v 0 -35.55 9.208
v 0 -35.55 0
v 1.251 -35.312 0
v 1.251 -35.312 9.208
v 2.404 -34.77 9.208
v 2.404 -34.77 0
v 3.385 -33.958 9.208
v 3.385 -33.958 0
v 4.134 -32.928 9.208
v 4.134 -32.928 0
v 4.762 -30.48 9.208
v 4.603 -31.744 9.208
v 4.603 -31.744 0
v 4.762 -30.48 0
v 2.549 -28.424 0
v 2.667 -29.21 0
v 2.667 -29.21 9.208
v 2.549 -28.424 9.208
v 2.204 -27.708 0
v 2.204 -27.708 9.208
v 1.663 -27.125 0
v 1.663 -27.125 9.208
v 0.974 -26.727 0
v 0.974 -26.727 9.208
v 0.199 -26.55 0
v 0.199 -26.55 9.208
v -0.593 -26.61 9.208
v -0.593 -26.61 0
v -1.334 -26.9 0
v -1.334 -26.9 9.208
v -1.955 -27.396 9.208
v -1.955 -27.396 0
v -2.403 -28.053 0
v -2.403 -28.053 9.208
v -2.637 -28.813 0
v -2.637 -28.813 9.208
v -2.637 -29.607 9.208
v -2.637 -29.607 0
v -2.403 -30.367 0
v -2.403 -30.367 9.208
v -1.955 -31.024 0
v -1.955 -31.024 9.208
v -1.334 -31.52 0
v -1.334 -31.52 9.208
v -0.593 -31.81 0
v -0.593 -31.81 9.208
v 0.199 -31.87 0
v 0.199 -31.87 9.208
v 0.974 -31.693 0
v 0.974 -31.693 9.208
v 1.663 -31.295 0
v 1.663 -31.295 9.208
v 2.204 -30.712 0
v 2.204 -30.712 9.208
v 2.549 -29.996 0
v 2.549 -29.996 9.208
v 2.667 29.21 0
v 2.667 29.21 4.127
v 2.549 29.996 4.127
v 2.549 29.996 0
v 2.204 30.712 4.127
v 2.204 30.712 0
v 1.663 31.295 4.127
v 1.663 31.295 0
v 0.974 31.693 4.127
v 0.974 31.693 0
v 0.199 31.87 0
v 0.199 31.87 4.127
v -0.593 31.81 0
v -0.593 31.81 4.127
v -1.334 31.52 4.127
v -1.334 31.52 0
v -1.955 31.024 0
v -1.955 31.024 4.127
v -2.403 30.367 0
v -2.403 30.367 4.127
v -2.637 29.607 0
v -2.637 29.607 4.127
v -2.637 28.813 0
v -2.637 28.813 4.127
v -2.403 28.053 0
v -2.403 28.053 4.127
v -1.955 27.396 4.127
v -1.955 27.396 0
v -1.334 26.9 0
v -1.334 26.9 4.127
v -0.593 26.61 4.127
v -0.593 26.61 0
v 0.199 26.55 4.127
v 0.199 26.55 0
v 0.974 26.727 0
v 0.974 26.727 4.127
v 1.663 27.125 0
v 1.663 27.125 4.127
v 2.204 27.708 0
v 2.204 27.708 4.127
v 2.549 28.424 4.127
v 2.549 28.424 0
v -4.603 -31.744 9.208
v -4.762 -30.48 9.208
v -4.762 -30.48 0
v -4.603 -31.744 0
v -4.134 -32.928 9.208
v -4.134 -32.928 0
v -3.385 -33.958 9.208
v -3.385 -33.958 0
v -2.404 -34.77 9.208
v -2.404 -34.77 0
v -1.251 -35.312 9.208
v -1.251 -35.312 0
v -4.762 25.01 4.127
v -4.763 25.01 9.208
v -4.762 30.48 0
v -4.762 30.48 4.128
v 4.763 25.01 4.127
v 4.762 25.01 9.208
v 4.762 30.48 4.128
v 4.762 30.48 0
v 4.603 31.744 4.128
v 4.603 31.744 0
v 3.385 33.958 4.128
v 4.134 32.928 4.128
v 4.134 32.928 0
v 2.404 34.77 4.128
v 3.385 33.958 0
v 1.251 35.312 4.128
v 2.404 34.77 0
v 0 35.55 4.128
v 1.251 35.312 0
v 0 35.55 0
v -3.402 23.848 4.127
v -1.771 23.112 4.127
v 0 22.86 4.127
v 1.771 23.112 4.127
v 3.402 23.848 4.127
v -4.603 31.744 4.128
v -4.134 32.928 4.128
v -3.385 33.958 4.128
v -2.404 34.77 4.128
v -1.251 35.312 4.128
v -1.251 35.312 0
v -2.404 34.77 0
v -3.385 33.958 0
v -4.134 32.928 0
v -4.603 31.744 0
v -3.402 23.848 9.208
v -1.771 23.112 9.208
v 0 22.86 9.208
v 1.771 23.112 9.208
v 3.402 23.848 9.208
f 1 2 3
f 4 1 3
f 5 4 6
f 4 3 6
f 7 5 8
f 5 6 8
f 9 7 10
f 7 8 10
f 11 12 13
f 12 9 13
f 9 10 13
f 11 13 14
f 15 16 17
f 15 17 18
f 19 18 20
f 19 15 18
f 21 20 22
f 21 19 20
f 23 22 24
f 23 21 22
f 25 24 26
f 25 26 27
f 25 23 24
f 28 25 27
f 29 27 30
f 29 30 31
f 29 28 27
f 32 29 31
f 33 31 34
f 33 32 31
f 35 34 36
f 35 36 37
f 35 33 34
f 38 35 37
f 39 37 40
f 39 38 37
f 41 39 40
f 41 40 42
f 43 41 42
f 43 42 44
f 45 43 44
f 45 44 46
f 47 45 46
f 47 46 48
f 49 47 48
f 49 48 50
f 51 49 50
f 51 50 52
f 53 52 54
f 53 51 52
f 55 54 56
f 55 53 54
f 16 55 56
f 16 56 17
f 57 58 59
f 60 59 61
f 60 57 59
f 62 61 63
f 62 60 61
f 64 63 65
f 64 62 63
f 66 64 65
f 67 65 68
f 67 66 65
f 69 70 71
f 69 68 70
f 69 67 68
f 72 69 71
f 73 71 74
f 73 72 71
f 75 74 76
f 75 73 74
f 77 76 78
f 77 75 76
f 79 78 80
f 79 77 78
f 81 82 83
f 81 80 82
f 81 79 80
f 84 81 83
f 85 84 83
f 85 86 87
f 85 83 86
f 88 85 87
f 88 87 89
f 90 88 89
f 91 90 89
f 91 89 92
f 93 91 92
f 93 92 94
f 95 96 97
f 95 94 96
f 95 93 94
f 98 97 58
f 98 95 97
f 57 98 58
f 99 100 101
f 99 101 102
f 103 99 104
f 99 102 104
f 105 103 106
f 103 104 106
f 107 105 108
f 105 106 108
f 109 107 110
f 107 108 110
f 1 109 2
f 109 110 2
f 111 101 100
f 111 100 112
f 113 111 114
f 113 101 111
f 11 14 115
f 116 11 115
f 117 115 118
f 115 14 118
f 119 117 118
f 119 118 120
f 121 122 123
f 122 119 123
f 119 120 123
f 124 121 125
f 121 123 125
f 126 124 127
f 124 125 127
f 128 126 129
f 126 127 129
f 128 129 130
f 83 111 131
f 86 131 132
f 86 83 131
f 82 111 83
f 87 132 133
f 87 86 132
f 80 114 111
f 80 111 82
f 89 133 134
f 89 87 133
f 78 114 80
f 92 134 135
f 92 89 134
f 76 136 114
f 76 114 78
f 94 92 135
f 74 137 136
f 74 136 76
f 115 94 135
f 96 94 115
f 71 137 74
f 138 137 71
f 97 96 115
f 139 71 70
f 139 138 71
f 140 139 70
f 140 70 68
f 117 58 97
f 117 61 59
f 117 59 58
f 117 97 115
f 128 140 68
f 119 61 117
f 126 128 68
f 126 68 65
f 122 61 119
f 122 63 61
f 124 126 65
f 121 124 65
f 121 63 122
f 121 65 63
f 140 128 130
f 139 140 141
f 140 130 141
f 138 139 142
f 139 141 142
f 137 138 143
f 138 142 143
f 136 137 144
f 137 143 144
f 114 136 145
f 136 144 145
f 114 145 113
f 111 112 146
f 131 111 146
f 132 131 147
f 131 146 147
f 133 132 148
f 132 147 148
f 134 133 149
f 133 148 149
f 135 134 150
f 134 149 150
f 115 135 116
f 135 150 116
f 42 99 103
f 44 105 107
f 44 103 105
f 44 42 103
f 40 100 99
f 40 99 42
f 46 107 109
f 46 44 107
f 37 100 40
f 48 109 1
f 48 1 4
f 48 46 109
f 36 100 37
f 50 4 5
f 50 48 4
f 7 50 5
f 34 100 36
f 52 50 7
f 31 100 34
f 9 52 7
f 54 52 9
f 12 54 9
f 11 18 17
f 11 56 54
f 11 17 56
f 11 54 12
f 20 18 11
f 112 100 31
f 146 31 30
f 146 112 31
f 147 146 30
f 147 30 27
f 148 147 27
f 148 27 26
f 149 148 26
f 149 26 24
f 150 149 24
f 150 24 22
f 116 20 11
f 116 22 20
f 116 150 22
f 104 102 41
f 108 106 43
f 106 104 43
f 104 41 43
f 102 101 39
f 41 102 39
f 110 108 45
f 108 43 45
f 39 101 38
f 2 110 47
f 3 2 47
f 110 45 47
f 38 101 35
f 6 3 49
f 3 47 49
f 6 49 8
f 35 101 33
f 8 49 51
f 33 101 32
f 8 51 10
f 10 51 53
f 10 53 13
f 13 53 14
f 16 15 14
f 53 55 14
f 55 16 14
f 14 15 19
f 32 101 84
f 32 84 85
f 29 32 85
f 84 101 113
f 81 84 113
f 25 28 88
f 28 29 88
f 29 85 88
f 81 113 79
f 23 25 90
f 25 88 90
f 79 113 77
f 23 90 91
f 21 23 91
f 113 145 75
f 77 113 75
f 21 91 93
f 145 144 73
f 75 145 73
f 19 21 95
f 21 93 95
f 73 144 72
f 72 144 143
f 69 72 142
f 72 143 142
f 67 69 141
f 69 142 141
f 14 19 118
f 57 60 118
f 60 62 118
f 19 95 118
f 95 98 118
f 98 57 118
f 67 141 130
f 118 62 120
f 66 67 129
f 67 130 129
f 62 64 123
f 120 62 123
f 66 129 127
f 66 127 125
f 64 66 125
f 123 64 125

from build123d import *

# Parameters (mm, degrees)
SKETCH1_W           = 9.525
SKETCH1_H           = 71.12
SKETCH1_R           = 2.667
BOSS_EXTRUDE1_DEPTH = 9.2075
FILLET1_R           = 5.08
SKETCH2_R           = 6.35
CUT_EXTRUDE1_DEPTH  = 5.08


with BuildPart() as part:
    # Sketch1 → Boss-Extrude1 (new body)
    with BuildSketch(Plane.XY):
        Rectangle(SKETCH1_W, SKETCH1_H)
        with Locations((0, -29.21)):
            Circle(SKETCH1_R, mode=Mode.SUBTRACT)
        with Locations((0, 29.21)):
            Circle(SKETCH1_R, mode=Mode.SUBTRACT)
    extrude(amount=BOSS_EXTRUDE1_DEPTH)

    # Fillet1
    # the kernel refuses this fillet: 5.08 mm, written as the material it takes off along each edge
    with BuildSketch(Plane(origin=(-4.7625, -35.56, -12.7), x_dir=(1, 0, 0), z_dir=(0, 0, 1)), Plane(origin=(4.7625, -35.56, -12.7), x_dir=(0, 1, 0), z_dir=(0, 0, 1)), Plane(origin=(4.7625, 35.56, -12.7), x_dir=(-1, 0, 0), z_dir=(0, 0, 1))) as fillet1_piece_1:
        with BuildLine():
            CenterArc((FILLET1_R, FILLET1_R), FILLET1_R, 180, 90)
            Line((0, FILLET1_R), (0, 0))
            Line((0, 0), (FILLET1_R, 0))
        make_face()
    extrude(amount=34.6075, mode=Mode.SUBTRACT)
    with BuildSketch(Plane(origin=(-4.7625, 35.56, -12.7), x_dir=(1, 0, 0), z_dir=(0, 0, 1))) as fillet1_piece_2:
        with BuildLine():
            CenterArc((FILLET1_R, -FILLET1_R), FILLET1_R, 90, 90)
            Line((0, -FILLET1_R), (0, 0))
            Line((0, 0), (FILLET1_R, 0))
        make_face()
    extrude(amount=34.6075, mode=Mode.SUBTRACT)

    # Sketch2 → Cut-Extrude1 (cut)
    with BuildSketch(Plane.XY.offset(9.2075)):
        with Locations((0, 29.21)):
            Circle(SKETCH2_R)
    extrude(amount=-CUT_EXTRUDE1_DEPTH, mode=Mode.SUBTRACT)


solid = part.part
